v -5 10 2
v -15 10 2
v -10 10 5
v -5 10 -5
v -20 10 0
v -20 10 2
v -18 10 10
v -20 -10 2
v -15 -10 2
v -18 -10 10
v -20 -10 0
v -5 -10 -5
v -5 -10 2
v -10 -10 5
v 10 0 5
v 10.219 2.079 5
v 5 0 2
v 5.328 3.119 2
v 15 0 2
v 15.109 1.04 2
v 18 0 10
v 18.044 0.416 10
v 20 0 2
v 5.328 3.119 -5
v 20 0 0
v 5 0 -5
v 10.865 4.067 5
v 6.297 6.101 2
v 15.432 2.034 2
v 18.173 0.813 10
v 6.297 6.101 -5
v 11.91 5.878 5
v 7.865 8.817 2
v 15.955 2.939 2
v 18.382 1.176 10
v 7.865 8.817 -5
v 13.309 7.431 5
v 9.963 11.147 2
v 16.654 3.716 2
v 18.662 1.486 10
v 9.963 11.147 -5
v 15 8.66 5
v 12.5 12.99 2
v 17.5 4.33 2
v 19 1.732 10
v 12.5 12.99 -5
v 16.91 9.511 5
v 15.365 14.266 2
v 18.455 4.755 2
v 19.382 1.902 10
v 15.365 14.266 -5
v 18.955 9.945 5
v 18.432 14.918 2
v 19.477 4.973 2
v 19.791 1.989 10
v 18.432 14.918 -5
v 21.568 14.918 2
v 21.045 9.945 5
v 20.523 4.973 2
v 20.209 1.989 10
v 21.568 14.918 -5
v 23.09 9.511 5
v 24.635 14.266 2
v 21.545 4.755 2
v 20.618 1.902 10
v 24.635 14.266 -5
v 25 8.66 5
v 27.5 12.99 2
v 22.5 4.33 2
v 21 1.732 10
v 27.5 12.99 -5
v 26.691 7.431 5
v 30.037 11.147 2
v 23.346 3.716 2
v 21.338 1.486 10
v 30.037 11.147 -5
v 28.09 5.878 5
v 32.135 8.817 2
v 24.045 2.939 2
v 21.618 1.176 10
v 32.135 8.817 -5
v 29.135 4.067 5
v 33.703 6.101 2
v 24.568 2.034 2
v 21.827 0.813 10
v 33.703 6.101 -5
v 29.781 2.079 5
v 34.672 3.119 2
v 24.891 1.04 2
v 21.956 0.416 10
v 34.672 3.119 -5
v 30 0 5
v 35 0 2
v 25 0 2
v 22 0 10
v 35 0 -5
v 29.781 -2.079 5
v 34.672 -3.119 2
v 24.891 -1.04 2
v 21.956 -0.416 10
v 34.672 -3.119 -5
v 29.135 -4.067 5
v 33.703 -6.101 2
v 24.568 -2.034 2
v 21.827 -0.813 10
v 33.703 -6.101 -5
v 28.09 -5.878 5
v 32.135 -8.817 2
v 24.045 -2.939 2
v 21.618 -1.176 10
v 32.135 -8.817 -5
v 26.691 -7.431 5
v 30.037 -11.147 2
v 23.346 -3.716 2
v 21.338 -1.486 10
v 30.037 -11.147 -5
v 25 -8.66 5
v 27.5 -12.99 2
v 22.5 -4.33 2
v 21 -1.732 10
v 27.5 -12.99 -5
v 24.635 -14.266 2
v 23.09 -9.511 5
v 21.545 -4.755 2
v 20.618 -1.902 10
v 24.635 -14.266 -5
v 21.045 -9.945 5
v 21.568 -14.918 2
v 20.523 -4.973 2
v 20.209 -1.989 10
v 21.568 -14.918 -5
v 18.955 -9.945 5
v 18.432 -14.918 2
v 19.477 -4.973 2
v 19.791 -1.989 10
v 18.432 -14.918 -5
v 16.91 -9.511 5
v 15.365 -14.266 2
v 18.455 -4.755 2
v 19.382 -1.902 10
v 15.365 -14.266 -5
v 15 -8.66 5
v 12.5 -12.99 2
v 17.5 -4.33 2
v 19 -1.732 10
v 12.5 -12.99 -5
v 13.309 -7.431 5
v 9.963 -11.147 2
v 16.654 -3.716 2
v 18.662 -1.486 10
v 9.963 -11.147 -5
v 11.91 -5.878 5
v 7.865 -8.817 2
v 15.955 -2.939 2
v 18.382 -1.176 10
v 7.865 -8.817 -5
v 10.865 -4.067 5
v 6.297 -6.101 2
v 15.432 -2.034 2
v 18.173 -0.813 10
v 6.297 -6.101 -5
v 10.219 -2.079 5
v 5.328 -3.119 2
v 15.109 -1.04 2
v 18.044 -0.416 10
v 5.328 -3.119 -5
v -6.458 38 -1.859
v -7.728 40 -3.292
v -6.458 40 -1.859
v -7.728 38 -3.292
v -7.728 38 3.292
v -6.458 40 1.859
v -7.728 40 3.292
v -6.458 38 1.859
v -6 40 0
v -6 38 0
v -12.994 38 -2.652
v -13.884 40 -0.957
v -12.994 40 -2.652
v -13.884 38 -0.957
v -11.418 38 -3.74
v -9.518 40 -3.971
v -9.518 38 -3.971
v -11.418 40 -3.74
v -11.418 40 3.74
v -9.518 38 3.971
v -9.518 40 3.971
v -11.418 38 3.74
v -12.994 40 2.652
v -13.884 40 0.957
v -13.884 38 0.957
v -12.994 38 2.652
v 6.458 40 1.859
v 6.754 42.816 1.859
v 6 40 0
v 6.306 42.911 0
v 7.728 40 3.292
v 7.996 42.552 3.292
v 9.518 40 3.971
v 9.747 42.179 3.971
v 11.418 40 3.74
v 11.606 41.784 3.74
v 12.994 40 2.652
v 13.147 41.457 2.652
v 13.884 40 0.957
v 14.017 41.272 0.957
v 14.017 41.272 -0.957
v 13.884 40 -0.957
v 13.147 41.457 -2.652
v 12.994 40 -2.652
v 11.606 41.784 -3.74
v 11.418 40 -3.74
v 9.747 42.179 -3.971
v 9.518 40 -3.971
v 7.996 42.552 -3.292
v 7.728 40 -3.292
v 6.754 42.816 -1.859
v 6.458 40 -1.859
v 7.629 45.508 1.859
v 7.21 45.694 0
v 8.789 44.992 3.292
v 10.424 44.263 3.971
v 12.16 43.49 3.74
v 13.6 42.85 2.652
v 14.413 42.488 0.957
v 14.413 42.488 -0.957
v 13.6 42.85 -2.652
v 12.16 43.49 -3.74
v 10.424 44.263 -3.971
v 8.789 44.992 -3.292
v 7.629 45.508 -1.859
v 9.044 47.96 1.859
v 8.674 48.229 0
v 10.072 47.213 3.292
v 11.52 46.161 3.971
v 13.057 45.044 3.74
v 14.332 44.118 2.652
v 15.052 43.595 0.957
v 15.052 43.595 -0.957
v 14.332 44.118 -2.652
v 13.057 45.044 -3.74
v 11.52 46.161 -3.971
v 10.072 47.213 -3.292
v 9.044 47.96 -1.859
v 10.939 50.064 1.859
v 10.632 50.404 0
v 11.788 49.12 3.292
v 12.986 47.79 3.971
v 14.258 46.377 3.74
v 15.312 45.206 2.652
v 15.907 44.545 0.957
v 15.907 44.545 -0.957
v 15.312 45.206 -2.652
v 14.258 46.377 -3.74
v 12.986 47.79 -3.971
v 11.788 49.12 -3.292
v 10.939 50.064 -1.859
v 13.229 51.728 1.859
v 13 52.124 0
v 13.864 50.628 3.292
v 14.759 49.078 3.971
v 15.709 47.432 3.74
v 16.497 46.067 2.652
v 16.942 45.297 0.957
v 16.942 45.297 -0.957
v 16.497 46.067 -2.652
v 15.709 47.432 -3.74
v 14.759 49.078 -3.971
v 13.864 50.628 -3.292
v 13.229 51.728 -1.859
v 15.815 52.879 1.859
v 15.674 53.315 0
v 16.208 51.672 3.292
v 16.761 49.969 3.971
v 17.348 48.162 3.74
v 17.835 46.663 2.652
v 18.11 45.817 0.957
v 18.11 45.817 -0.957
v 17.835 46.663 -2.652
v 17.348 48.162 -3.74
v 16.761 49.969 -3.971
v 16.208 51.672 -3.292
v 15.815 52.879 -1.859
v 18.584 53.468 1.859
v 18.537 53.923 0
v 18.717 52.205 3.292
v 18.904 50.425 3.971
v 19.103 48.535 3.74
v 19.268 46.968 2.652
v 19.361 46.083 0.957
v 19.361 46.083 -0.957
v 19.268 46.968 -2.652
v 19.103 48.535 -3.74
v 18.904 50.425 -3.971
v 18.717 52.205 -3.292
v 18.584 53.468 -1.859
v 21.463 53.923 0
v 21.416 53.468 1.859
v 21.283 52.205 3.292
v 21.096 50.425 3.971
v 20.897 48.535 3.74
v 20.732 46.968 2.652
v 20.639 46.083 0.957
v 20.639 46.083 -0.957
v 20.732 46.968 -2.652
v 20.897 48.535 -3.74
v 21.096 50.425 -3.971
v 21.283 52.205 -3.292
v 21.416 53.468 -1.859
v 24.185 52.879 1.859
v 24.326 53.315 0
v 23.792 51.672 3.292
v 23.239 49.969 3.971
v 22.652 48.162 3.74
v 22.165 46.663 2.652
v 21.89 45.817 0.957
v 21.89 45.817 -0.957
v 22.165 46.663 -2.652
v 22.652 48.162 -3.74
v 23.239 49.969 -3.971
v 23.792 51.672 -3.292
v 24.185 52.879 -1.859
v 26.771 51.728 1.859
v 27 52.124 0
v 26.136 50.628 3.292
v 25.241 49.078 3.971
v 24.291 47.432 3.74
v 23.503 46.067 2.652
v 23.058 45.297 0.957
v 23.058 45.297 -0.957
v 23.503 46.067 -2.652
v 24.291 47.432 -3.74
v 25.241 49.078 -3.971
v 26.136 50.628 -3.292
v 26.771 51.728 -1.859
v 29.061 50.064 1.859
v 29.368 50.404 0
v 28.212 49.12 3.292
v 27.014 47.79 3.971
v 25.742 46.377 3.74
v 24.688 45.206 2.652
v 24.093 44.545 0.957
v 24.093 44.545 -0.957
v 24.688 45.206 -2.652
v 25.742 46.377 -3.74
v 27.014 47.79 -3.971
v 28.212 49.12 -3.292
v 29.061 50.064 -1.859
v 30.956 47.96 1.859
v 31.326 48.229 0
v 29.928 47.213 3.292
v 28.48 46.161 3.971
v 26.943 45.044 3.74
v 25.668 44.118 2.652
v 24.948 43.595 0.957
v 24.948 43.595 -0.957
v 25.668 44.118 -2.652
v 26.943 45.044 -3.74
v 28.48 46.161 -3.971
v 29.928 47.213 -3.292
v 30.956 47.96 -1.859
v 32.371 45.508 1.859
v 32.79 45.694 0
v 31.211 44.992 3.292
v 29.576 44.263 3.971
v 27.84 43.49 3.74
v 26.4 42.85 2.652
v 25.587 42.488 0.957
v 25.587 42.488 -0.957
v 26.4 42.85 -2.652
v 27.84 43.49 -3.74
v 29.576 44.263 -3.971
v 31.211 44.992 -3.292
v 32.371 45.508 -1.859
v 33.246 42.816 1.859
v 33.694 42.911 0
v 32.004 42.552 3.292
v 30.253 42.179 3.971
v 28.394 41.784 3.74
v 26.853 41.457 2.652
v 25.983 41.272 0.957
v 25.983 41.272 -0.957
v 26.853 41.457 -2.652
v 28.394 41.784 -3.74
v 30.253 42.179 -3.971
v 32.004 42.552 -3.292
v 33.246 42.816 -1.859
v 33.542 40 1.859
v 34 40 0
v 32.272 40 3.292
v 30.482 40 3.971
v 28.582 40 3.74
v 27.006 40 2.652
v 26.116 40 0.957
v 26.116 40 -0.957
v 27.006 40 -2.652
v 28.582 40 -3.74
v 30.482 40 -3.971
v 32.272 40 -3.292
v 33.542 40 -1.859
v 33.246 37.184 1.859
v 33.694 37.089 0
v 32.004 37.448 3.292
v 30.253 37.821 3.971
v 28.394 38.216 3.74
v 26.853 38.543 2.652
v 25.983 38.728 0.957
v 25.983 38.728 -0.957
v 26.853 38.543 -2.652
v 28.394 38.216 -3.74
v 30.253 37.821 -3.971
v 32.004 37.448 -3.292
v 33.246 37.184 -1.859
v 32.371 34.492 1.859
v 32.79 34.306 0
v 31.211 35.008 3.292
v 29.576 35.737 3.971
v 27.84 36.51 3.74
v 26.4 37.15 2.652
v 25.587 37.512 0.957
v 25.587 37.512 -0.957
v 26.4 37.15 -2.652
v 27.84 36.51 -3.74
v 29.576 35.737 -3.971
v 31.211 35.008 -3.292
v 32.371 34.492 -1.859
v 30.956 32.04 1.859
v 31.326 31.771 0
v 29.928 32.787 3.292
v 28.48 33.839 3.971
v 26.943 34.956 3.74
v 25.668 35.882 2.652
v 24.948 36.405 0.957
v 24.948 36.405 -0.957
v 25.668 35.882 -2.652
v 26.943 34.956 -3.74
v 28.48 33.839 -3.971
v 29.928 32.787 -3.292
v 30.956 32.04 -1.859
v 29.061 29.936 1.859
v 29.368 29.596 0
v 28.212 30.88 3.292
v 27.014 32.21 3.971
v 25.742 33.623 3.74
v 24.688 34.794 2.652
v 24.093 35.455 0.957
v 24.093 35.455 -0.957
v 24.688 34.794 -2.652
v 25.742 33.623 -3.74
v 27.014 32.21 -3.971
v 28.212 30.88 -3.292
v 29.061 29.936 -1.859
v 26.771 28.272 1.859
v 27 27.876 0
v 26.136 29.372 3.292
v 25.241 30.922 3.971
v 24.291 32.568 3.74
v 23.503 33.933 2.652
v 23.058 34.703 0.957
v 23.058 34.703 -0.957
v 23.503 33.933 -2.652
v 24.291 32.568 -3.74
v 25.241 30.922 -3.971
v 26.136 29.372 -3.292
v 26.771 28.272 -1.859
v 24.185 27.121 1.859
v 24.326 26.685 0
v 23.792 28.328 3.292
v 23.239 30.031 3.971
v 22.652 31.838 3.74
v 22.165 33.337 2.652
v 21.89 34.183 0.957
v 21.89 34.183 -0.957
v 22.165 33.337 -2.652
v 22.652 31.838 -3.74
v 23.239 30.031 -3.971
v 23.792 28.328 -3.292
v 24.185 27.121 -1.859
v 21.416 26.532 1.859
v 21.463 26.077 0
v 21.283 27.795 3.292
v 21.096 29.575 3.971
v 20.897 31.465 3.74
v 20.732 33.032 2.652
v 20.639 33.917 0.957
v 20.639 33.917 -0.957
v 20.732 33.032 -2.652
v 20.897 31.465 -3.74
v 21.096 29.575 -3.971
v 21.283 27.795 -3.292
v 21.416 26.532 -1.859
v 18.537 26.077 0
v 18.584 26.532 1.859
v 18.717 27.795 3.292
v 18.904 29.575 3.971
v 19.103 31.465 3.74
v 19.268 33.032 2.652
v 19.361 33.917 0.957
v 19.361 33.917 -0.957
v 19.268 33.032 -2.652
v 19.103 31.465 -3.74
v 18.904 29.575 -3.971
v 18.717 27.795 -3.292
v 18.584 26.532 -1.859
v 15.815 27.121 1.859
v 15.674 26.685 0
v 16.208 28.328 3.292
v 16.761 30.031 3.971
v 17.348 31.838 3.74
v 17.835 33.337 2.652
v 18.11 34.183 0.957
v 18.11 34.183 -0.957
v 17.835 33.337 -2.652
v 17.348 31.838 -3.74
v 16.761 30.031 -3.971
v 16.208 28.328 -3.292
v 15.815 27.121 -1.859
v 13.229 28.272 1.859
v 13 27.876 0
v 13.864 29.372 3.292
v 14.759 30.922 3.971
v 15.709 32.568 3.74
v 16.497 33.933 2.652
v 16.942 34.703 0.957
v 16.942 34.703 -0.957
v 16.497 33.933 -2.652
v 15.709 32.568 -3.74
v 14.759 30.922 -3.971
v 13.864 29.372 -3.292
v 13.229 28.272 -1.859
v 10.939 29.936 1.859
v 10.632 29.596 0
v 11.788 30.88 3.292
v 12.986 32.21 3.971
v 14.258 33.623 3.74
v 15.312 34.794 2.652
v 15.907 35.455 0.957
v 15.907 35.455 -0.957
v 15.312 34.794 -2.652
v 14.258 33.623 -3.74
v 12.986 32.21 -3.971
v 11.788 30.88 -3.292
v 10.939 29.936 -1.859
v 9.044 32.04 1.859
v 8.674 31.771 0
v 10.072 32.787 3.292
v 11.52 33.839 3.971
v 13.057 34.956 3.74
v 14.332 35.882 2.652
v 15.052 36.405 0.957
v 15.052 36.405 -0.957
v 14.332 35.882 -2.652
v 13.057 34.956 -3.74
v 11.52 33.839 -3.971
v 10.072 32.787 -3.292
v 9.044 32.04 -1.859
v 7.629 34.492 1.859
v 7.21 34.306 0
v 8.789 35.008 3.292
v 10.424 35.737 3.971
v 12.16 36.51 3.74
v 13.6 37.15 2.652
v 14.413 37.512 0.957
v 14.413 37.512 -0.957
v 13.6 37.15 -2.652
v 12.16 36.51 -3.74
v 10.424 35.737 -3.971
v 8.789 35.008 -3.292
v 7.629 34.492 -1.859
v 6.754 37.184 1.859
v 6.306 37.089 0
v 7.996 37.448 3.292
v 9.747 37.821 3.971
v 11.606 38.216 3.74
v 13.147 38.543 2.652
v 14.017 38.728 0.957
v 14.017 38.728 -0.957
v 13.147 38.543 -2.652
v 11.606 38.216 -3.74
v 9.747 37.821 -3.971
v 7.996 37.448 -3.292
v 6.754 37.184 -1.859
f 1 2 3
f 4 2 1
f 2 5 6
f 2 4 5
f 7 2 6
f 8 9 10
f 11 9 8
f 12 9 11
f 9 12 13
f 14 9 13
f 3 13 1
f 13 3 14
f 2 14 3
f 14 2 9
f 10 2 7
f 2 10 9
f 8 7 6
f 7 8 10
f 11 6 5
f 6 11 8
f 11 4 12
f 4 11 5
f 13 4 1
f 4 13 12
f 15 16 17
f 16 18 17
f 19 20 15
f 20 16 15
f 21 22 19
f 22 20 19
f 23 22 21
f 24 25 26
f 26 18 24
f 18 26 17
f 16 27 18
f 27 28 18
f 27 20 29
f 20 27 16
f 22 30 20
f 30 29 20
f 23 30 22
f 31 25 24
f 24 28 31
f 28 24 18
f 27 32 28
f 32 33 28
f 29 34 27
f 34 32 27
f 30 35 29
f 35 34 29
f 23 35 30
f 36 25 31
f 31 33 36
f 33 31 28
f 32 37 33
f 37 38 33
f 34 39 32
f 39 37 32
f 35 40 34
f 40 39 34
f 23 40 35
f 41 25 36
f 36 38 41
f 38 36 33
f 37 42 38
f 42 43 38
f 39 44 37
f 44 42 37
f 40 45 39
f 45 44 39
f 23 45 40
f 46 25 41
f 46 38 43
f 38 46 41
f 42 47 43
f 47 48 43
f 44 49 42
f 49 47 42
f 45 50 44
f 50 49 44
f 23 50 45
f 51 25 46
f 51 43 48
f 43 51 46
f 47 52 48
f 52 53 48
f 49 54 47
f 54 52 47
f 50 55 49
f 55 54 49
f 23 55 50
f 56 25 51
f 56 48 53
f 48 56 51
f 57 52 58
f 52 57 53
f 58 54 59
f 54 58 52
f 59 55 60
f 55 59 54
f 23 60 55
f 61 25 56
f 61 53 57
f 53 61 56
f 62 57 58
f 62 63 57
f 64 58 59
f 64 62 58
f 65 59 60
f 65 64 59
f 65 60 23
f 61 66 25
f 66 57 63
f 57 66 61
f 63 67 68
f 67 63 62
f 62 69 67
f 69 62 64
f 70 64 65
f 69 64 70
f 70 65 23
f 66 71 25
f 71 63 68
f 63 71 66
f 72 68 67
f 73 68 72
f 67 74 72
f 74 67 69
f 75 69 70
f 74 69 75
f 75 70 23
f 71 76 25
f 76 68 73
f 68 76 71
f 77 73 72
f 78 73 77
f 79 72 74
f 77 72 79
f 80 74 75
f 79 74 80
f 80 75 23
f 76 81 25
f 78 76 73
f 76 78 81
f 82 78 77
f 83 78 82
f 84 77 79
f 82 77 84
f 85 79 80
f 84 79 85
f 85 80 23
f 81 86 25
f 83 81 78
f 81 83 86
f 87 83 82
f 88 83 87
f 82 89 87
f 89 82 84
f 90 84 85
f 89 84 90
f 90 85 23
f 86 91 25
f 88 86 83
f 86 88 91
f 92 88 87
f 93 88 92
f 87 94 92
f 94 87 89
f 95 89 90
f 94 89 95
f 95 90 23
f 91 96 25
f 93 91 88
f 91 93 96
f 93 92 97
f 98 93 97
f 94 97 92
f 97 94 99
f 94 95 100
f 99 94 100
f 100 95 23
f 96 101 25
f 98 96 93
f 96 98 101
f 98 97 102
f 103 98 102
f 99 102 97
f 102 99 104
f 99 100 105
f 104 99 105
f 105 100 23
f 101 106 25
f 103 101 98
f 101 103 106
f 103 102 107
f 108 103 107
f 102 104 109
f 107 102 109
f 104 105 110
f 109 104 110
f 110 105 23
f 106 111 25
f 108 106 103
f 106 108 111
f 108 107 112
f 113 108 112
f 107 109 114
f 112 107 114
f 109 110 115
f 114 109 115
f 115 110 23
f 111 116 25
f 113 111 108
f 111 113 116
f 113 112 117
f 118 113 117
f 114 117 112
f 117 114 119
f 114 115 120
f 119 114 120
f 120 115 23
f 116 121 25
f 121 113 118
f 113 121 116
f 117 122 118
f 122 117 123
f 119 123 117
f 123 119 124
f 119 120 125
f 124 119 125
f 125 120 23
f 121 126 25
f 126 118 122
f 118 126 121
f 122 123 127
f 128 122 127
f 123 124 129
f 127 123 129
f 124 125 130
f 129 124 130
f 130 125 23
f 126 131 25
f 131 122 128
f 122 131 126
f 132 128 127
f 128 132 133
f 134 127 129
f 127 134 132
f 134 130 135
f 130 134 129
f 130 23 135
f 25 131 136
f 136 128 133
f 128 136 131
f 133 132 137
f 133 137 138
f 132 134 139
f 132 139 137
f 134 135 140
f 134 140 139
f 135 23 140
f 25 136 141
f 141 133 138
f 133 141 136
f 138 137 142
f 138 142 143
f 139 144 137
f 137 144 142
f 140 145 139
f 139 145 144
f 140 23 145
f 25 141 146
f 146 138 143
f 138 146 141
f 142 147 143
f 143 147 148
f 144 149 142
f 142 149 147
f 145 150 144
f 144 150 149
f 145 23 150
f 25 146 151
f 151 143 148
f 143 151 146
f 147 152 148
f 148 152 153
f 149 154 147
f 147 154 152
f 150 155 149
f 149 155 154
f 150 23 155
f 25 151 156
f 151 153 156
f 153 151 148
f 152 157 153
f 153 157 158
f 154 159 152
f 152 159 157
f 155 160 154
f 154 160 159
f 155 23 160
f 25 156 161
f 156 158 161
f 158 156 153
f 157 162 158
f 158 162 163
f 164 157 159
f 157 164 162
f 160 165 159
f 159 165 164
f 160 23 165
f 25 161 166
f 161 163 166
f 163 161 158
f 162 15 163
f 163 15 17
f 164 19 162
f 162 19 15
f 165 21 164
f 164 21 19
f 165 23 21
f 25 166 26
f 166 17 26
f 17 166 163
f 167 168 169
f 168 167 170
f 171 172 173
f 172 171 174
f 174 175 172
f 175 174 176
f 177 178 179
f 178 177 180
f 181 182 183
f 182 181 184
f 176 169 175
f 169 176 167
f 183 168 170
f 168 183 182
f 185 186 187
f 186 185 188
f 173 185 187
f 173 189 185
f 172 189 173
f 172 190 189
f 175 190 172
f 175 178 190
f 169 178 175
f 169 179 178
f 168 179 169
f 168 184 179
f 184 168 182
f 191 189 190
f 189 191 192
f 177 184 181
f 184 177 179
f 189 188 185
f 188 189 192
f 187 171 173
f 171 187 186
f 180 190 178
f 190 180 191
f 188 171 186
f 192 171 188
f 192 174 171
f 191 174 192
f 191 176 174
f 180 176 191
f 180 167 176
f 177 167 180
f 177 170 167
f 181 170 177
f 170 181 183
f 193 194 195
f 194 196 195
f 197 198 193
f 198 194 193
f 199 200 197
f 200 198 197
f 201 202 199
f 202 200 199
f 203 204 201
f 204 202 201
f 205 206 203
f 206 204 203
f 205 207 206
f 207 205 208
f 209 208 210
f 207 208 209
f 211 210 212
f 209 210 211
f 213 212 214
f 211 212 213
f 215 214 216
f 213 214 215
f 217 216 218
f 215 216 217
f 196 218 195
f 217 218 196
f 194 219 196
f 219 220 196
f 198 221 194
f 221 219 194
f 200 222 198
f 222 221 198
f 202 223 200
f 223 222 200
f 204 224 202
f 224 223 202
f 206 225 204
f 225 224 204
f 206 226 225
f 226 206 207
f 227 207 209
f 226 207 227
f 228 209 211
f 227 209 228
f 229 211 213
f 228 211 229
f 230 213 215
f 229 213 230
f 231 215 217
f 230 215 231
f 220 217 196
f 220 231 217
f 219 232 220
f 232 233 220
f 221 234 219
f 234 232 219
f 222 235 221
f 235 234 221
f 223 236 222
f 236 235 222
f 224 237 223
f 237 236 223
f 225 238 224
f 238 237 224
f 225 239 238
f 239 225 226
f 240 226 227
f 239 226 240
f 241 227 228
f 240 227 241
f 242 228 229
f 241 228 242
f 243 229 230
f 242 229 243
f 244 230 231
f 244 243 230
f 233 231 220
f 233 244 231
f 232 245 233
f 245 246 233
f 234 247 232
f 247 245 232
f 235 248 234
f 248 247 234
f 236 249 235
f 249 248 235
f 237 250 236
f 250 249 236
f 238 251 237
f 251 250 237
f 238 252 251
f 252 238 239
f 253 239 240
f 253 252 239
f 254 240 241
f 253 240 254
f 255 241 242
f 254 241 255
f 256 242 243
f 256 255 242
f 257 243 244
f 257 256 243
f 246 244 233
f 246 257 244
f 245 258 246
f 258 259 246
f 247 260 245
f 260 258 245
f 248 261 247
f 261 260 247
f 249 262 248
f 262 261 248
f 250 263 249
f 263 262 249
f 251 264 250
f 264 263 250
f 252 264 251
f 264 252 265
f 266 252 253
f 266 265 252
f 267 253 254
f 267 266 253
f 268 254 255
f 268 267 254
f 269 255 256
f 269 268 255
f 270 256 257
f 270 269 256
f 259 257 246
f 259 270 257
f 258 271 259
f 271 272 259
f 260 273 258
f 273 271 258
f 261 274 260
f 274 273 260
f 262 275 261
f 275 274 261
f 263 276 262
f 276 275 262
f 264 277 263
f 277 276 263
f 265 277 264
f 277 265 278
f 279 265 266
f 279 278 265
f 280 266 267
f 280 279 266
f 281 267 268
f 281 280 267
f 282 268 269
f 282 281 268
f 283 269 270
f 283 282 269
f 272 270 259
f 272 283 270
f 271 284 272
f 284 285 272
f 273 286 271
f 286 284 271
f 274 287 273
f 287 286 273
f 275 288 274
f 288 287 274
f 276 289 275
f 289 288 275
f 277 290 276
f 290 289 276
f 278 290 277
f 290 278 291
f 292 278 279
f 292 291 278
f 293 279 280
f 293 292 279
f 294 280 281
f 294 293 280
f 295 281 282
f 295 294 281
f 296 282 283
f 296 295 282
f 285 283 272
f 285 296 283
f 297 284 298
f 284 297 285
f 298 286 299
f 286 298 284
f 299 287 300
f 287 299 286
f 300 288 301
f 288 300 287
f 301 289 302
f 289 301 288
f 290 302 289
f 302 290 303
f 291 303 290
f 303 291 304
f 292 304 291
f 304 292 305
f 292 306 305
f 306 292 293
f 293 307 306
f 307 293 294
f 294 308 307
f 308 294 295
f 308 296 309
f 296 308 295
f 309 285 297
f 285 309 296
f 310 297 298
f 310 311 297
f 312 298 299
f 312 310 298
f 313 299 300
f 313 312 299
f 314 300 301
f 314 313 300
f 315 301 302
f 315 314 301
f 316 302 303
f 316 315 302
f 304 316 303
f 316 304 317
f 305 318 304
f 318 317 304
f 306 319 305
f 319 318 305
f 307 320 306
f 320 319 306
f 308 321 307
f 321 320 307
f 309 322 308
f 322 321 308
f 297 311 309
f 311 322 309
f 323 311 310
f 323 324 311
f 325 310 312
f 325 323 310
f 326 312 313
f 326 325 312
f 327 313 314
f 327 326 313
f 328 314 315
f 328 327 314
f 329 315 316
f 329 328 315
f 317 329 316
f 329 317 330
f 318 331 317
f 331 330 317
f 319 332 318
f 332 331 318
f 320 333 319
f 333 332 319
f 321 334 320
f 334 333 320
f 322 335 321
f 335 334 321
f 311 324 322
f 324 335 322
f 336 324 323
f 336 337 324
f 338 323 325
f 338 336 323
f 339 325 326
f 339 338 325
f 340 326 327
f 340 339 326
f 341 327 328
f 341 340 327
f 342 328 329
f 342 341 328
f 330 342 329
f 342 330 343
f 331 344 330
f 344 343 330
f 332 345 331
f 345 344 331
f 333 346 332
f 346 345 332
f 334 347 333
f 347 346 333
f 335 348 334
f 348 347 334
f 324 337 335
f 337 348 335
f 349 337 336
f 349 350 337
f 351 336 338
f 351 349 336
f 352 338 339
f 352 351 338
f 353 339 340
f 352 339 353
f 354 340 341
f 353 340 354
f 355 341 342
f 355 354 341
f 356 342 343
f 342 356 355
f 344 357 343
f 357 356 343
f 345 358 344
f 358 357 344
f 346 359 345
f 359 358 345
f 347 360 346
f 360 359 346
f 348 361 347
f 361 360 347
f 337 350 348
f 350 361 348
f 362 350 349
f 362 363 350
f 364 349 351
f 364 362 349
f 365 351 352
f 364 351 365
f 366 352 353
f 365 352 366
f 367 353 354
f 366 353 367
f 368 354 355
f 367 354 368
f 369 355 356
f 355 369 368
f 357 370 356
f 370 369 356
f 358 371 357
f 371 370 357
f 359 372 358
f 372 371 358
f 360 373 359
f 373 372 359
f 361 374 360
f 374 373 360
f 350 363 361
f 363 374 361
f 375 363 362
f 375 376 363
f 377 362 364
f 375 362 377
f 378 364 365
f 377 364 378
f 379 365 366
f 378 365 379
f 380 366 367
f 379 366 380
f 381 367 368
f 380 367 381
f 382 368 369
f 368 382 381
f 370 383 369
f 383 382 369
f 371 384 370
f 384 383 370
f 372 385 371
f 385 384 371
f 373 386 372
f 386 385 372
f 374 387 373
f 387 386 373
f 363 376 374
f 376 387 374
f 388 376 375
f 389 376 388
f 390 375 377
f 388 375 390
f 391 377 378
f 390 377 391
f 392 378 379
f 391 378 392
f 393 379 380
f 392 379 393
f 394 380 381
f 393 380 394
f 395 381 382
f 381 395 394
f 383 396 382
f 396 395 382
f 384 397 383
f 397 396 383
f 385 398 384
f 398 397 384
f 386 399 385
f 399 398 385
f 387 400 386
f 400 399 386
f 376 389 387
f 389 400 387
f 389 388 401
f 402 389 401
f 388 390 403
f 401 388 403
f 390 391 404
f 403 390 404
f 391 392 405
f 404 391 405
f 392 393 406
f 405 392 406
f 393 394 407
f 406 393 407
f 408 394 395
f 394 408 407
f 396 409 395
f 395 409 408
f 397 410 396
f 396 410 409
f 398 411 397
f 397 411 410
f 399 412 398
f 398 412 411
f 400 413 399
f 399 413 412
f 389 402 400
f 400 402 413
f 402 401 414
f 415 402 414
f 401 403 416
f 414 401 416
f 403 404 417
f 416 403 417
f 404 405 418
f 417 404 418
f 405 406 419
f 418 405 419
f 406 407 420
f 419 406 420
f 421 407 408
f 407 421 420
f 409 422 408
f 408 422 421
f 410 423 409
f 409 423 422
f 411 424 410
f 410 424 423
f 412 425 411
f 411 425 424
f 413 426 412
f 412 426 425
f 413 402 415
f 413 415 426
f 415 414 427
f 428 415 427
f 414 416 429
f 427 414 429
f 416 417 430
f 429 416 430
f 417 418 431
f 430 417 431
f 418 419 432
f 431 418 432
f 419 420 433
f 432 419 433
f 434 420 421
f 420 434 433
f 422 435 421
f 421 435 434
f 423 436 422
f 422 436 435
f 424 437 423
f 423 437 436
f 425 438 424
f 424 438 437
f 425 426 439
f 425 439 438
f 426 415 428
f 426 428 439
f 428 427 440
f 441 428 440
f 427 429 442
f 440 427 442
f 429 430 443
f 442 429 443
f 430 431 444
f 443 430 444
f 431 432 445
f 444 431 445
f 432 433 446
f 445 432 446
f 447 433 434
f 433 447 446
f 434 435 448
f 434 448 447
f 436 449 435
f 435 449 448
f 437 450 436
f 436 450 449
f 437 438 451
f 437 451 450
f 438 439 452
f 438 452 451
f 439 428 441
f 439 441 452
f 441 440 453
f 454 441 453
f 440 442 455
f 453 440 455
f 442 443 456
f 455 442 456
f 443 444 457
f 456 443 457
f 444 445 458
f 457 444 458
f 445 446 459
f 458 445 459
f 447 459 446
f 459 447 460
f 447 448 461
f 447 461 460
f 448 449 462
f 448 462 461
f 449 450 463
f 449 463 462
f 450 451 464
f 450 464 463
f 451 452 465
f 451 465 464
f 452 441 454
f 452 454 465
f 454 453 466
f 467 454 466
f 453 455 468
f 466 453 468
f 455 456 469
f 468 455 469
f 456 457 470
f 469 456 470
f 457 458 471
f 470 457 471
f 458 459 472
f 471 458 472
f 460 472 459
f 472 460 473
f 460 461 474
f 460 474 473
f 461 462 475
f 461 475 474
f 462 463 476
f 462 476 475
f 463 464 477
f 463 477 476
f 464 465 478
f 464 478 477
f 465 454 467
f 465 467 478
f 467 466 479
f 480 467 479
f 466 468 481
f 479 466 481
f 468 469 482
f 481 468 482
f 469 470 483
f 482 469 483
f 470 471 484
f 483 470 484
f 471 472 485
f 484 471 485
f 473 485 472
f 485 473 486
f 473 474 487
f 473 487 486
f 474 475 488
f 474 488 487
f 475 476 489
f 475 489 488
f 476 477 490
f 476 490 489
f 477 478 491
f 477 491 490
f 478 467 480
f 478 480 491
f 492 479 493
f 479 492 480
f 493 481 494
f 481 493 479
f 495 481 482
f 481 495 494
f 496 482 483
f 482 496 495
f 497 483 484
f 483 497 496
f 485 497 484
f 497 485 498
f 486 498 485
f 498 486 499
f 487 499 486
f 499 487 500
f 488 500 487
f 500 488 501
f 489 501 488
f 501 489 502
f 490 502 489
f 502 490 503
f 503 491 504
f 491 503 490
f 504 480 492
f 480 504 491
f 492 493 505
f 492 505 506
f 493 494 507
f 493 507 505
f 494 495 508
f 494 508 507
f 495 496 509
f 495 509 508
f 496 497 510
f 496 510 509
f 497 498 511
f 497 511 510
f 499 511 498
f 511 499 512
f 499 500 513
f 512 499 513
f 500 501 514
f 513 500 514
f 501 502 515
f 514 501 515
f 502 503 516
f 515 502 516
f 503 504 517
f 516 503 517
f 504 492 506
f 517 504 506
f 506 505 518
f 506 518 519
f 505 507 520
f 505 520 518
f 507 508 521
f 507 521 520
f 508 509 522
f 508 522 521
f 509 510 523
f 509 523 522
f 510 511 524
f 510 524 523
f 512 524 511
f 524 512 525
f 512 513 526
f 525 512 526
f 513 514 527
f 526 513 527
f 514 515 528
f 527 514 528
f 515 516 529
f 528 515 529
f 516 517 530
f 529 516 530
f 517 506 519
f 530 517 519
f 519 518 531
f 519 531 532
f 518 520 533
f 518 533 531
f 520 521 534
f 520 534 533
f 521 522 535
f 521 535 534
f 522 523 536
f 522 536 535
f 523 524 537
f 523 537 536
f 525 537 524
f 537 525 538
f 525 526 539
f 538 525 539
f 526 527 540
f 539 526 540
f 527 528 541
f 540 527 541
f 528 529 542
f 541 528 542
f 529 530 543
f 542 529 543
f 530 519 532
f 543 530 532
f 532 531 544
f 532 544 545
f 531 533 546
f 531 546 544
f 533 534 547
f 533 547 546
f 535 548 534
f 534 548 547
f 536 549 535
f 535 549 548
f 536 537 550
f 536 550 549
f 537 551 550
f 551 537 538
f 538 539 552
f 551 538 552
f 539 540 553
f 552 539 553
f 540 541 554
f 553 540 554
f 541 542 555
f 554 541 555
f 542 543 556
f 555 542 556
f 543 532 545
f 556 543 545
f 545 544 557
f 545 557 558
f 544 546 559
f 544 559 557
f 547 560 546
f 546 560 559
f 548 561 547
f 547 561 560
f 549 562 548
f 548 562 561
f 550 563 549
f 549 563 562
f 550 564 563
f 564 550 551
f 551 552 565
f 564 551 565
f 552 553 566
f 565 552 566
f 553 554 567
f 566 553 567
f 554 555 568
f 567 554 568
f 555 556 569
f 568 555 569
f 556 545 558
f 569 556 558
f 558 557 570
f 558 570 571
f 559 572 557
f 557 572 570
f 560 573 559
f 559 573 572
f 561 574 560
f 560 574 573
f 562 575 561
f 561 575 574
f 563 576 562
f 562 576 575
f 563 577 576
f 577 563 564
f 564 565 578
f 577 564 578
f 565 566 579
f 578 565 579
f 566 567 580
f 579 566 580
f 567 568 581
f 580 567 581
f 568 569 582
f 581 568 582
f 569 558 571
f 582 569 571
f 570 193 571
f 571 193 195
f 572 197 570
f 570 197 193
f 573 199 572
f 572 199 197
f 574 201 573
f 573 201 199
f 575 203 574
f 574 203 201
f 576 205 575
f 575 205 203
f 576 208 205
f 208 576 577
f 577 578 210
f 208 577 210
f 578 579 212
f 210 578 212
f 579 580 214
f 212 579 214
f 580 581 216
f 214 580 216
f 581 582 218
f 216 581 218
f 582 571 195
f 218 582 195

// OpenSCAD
/*
 * polygon() creates a 2D shape in the XY plane.
 * rotate_extrude() extends it into the Z plane.
 */

module shape()
{
	polygon([
		[0,0],
		[0,2],
		[2,10],
		[5,2],
		[10,5],
		[15,2],
		[15,-5],
	]);
}

// Linear extrude to show what the shape looks like
translate([-20,10,0]) 
rotate([90,0,0])
linear_extrude(height=20)
shape();

// Rotate the shape around a circle
translate([20,0,0]) 
rotate_extrude() shape();

// Show the cross section of the torus
translate([-10,40,0]) 
rotate([90,0,0])
linear_extrude(height=2)
circle(r=4);

// Create a torus by rotating a circle
// that has been translated from the origin.
// (if it remained at the origin, it would be
// a sphere)
translate([20,40,0]) 
rotate_extrude()
translate([10,0,0])
circle(r=4);


%translate([0,20,-10]) cube([80,80,0.5], center=true);
